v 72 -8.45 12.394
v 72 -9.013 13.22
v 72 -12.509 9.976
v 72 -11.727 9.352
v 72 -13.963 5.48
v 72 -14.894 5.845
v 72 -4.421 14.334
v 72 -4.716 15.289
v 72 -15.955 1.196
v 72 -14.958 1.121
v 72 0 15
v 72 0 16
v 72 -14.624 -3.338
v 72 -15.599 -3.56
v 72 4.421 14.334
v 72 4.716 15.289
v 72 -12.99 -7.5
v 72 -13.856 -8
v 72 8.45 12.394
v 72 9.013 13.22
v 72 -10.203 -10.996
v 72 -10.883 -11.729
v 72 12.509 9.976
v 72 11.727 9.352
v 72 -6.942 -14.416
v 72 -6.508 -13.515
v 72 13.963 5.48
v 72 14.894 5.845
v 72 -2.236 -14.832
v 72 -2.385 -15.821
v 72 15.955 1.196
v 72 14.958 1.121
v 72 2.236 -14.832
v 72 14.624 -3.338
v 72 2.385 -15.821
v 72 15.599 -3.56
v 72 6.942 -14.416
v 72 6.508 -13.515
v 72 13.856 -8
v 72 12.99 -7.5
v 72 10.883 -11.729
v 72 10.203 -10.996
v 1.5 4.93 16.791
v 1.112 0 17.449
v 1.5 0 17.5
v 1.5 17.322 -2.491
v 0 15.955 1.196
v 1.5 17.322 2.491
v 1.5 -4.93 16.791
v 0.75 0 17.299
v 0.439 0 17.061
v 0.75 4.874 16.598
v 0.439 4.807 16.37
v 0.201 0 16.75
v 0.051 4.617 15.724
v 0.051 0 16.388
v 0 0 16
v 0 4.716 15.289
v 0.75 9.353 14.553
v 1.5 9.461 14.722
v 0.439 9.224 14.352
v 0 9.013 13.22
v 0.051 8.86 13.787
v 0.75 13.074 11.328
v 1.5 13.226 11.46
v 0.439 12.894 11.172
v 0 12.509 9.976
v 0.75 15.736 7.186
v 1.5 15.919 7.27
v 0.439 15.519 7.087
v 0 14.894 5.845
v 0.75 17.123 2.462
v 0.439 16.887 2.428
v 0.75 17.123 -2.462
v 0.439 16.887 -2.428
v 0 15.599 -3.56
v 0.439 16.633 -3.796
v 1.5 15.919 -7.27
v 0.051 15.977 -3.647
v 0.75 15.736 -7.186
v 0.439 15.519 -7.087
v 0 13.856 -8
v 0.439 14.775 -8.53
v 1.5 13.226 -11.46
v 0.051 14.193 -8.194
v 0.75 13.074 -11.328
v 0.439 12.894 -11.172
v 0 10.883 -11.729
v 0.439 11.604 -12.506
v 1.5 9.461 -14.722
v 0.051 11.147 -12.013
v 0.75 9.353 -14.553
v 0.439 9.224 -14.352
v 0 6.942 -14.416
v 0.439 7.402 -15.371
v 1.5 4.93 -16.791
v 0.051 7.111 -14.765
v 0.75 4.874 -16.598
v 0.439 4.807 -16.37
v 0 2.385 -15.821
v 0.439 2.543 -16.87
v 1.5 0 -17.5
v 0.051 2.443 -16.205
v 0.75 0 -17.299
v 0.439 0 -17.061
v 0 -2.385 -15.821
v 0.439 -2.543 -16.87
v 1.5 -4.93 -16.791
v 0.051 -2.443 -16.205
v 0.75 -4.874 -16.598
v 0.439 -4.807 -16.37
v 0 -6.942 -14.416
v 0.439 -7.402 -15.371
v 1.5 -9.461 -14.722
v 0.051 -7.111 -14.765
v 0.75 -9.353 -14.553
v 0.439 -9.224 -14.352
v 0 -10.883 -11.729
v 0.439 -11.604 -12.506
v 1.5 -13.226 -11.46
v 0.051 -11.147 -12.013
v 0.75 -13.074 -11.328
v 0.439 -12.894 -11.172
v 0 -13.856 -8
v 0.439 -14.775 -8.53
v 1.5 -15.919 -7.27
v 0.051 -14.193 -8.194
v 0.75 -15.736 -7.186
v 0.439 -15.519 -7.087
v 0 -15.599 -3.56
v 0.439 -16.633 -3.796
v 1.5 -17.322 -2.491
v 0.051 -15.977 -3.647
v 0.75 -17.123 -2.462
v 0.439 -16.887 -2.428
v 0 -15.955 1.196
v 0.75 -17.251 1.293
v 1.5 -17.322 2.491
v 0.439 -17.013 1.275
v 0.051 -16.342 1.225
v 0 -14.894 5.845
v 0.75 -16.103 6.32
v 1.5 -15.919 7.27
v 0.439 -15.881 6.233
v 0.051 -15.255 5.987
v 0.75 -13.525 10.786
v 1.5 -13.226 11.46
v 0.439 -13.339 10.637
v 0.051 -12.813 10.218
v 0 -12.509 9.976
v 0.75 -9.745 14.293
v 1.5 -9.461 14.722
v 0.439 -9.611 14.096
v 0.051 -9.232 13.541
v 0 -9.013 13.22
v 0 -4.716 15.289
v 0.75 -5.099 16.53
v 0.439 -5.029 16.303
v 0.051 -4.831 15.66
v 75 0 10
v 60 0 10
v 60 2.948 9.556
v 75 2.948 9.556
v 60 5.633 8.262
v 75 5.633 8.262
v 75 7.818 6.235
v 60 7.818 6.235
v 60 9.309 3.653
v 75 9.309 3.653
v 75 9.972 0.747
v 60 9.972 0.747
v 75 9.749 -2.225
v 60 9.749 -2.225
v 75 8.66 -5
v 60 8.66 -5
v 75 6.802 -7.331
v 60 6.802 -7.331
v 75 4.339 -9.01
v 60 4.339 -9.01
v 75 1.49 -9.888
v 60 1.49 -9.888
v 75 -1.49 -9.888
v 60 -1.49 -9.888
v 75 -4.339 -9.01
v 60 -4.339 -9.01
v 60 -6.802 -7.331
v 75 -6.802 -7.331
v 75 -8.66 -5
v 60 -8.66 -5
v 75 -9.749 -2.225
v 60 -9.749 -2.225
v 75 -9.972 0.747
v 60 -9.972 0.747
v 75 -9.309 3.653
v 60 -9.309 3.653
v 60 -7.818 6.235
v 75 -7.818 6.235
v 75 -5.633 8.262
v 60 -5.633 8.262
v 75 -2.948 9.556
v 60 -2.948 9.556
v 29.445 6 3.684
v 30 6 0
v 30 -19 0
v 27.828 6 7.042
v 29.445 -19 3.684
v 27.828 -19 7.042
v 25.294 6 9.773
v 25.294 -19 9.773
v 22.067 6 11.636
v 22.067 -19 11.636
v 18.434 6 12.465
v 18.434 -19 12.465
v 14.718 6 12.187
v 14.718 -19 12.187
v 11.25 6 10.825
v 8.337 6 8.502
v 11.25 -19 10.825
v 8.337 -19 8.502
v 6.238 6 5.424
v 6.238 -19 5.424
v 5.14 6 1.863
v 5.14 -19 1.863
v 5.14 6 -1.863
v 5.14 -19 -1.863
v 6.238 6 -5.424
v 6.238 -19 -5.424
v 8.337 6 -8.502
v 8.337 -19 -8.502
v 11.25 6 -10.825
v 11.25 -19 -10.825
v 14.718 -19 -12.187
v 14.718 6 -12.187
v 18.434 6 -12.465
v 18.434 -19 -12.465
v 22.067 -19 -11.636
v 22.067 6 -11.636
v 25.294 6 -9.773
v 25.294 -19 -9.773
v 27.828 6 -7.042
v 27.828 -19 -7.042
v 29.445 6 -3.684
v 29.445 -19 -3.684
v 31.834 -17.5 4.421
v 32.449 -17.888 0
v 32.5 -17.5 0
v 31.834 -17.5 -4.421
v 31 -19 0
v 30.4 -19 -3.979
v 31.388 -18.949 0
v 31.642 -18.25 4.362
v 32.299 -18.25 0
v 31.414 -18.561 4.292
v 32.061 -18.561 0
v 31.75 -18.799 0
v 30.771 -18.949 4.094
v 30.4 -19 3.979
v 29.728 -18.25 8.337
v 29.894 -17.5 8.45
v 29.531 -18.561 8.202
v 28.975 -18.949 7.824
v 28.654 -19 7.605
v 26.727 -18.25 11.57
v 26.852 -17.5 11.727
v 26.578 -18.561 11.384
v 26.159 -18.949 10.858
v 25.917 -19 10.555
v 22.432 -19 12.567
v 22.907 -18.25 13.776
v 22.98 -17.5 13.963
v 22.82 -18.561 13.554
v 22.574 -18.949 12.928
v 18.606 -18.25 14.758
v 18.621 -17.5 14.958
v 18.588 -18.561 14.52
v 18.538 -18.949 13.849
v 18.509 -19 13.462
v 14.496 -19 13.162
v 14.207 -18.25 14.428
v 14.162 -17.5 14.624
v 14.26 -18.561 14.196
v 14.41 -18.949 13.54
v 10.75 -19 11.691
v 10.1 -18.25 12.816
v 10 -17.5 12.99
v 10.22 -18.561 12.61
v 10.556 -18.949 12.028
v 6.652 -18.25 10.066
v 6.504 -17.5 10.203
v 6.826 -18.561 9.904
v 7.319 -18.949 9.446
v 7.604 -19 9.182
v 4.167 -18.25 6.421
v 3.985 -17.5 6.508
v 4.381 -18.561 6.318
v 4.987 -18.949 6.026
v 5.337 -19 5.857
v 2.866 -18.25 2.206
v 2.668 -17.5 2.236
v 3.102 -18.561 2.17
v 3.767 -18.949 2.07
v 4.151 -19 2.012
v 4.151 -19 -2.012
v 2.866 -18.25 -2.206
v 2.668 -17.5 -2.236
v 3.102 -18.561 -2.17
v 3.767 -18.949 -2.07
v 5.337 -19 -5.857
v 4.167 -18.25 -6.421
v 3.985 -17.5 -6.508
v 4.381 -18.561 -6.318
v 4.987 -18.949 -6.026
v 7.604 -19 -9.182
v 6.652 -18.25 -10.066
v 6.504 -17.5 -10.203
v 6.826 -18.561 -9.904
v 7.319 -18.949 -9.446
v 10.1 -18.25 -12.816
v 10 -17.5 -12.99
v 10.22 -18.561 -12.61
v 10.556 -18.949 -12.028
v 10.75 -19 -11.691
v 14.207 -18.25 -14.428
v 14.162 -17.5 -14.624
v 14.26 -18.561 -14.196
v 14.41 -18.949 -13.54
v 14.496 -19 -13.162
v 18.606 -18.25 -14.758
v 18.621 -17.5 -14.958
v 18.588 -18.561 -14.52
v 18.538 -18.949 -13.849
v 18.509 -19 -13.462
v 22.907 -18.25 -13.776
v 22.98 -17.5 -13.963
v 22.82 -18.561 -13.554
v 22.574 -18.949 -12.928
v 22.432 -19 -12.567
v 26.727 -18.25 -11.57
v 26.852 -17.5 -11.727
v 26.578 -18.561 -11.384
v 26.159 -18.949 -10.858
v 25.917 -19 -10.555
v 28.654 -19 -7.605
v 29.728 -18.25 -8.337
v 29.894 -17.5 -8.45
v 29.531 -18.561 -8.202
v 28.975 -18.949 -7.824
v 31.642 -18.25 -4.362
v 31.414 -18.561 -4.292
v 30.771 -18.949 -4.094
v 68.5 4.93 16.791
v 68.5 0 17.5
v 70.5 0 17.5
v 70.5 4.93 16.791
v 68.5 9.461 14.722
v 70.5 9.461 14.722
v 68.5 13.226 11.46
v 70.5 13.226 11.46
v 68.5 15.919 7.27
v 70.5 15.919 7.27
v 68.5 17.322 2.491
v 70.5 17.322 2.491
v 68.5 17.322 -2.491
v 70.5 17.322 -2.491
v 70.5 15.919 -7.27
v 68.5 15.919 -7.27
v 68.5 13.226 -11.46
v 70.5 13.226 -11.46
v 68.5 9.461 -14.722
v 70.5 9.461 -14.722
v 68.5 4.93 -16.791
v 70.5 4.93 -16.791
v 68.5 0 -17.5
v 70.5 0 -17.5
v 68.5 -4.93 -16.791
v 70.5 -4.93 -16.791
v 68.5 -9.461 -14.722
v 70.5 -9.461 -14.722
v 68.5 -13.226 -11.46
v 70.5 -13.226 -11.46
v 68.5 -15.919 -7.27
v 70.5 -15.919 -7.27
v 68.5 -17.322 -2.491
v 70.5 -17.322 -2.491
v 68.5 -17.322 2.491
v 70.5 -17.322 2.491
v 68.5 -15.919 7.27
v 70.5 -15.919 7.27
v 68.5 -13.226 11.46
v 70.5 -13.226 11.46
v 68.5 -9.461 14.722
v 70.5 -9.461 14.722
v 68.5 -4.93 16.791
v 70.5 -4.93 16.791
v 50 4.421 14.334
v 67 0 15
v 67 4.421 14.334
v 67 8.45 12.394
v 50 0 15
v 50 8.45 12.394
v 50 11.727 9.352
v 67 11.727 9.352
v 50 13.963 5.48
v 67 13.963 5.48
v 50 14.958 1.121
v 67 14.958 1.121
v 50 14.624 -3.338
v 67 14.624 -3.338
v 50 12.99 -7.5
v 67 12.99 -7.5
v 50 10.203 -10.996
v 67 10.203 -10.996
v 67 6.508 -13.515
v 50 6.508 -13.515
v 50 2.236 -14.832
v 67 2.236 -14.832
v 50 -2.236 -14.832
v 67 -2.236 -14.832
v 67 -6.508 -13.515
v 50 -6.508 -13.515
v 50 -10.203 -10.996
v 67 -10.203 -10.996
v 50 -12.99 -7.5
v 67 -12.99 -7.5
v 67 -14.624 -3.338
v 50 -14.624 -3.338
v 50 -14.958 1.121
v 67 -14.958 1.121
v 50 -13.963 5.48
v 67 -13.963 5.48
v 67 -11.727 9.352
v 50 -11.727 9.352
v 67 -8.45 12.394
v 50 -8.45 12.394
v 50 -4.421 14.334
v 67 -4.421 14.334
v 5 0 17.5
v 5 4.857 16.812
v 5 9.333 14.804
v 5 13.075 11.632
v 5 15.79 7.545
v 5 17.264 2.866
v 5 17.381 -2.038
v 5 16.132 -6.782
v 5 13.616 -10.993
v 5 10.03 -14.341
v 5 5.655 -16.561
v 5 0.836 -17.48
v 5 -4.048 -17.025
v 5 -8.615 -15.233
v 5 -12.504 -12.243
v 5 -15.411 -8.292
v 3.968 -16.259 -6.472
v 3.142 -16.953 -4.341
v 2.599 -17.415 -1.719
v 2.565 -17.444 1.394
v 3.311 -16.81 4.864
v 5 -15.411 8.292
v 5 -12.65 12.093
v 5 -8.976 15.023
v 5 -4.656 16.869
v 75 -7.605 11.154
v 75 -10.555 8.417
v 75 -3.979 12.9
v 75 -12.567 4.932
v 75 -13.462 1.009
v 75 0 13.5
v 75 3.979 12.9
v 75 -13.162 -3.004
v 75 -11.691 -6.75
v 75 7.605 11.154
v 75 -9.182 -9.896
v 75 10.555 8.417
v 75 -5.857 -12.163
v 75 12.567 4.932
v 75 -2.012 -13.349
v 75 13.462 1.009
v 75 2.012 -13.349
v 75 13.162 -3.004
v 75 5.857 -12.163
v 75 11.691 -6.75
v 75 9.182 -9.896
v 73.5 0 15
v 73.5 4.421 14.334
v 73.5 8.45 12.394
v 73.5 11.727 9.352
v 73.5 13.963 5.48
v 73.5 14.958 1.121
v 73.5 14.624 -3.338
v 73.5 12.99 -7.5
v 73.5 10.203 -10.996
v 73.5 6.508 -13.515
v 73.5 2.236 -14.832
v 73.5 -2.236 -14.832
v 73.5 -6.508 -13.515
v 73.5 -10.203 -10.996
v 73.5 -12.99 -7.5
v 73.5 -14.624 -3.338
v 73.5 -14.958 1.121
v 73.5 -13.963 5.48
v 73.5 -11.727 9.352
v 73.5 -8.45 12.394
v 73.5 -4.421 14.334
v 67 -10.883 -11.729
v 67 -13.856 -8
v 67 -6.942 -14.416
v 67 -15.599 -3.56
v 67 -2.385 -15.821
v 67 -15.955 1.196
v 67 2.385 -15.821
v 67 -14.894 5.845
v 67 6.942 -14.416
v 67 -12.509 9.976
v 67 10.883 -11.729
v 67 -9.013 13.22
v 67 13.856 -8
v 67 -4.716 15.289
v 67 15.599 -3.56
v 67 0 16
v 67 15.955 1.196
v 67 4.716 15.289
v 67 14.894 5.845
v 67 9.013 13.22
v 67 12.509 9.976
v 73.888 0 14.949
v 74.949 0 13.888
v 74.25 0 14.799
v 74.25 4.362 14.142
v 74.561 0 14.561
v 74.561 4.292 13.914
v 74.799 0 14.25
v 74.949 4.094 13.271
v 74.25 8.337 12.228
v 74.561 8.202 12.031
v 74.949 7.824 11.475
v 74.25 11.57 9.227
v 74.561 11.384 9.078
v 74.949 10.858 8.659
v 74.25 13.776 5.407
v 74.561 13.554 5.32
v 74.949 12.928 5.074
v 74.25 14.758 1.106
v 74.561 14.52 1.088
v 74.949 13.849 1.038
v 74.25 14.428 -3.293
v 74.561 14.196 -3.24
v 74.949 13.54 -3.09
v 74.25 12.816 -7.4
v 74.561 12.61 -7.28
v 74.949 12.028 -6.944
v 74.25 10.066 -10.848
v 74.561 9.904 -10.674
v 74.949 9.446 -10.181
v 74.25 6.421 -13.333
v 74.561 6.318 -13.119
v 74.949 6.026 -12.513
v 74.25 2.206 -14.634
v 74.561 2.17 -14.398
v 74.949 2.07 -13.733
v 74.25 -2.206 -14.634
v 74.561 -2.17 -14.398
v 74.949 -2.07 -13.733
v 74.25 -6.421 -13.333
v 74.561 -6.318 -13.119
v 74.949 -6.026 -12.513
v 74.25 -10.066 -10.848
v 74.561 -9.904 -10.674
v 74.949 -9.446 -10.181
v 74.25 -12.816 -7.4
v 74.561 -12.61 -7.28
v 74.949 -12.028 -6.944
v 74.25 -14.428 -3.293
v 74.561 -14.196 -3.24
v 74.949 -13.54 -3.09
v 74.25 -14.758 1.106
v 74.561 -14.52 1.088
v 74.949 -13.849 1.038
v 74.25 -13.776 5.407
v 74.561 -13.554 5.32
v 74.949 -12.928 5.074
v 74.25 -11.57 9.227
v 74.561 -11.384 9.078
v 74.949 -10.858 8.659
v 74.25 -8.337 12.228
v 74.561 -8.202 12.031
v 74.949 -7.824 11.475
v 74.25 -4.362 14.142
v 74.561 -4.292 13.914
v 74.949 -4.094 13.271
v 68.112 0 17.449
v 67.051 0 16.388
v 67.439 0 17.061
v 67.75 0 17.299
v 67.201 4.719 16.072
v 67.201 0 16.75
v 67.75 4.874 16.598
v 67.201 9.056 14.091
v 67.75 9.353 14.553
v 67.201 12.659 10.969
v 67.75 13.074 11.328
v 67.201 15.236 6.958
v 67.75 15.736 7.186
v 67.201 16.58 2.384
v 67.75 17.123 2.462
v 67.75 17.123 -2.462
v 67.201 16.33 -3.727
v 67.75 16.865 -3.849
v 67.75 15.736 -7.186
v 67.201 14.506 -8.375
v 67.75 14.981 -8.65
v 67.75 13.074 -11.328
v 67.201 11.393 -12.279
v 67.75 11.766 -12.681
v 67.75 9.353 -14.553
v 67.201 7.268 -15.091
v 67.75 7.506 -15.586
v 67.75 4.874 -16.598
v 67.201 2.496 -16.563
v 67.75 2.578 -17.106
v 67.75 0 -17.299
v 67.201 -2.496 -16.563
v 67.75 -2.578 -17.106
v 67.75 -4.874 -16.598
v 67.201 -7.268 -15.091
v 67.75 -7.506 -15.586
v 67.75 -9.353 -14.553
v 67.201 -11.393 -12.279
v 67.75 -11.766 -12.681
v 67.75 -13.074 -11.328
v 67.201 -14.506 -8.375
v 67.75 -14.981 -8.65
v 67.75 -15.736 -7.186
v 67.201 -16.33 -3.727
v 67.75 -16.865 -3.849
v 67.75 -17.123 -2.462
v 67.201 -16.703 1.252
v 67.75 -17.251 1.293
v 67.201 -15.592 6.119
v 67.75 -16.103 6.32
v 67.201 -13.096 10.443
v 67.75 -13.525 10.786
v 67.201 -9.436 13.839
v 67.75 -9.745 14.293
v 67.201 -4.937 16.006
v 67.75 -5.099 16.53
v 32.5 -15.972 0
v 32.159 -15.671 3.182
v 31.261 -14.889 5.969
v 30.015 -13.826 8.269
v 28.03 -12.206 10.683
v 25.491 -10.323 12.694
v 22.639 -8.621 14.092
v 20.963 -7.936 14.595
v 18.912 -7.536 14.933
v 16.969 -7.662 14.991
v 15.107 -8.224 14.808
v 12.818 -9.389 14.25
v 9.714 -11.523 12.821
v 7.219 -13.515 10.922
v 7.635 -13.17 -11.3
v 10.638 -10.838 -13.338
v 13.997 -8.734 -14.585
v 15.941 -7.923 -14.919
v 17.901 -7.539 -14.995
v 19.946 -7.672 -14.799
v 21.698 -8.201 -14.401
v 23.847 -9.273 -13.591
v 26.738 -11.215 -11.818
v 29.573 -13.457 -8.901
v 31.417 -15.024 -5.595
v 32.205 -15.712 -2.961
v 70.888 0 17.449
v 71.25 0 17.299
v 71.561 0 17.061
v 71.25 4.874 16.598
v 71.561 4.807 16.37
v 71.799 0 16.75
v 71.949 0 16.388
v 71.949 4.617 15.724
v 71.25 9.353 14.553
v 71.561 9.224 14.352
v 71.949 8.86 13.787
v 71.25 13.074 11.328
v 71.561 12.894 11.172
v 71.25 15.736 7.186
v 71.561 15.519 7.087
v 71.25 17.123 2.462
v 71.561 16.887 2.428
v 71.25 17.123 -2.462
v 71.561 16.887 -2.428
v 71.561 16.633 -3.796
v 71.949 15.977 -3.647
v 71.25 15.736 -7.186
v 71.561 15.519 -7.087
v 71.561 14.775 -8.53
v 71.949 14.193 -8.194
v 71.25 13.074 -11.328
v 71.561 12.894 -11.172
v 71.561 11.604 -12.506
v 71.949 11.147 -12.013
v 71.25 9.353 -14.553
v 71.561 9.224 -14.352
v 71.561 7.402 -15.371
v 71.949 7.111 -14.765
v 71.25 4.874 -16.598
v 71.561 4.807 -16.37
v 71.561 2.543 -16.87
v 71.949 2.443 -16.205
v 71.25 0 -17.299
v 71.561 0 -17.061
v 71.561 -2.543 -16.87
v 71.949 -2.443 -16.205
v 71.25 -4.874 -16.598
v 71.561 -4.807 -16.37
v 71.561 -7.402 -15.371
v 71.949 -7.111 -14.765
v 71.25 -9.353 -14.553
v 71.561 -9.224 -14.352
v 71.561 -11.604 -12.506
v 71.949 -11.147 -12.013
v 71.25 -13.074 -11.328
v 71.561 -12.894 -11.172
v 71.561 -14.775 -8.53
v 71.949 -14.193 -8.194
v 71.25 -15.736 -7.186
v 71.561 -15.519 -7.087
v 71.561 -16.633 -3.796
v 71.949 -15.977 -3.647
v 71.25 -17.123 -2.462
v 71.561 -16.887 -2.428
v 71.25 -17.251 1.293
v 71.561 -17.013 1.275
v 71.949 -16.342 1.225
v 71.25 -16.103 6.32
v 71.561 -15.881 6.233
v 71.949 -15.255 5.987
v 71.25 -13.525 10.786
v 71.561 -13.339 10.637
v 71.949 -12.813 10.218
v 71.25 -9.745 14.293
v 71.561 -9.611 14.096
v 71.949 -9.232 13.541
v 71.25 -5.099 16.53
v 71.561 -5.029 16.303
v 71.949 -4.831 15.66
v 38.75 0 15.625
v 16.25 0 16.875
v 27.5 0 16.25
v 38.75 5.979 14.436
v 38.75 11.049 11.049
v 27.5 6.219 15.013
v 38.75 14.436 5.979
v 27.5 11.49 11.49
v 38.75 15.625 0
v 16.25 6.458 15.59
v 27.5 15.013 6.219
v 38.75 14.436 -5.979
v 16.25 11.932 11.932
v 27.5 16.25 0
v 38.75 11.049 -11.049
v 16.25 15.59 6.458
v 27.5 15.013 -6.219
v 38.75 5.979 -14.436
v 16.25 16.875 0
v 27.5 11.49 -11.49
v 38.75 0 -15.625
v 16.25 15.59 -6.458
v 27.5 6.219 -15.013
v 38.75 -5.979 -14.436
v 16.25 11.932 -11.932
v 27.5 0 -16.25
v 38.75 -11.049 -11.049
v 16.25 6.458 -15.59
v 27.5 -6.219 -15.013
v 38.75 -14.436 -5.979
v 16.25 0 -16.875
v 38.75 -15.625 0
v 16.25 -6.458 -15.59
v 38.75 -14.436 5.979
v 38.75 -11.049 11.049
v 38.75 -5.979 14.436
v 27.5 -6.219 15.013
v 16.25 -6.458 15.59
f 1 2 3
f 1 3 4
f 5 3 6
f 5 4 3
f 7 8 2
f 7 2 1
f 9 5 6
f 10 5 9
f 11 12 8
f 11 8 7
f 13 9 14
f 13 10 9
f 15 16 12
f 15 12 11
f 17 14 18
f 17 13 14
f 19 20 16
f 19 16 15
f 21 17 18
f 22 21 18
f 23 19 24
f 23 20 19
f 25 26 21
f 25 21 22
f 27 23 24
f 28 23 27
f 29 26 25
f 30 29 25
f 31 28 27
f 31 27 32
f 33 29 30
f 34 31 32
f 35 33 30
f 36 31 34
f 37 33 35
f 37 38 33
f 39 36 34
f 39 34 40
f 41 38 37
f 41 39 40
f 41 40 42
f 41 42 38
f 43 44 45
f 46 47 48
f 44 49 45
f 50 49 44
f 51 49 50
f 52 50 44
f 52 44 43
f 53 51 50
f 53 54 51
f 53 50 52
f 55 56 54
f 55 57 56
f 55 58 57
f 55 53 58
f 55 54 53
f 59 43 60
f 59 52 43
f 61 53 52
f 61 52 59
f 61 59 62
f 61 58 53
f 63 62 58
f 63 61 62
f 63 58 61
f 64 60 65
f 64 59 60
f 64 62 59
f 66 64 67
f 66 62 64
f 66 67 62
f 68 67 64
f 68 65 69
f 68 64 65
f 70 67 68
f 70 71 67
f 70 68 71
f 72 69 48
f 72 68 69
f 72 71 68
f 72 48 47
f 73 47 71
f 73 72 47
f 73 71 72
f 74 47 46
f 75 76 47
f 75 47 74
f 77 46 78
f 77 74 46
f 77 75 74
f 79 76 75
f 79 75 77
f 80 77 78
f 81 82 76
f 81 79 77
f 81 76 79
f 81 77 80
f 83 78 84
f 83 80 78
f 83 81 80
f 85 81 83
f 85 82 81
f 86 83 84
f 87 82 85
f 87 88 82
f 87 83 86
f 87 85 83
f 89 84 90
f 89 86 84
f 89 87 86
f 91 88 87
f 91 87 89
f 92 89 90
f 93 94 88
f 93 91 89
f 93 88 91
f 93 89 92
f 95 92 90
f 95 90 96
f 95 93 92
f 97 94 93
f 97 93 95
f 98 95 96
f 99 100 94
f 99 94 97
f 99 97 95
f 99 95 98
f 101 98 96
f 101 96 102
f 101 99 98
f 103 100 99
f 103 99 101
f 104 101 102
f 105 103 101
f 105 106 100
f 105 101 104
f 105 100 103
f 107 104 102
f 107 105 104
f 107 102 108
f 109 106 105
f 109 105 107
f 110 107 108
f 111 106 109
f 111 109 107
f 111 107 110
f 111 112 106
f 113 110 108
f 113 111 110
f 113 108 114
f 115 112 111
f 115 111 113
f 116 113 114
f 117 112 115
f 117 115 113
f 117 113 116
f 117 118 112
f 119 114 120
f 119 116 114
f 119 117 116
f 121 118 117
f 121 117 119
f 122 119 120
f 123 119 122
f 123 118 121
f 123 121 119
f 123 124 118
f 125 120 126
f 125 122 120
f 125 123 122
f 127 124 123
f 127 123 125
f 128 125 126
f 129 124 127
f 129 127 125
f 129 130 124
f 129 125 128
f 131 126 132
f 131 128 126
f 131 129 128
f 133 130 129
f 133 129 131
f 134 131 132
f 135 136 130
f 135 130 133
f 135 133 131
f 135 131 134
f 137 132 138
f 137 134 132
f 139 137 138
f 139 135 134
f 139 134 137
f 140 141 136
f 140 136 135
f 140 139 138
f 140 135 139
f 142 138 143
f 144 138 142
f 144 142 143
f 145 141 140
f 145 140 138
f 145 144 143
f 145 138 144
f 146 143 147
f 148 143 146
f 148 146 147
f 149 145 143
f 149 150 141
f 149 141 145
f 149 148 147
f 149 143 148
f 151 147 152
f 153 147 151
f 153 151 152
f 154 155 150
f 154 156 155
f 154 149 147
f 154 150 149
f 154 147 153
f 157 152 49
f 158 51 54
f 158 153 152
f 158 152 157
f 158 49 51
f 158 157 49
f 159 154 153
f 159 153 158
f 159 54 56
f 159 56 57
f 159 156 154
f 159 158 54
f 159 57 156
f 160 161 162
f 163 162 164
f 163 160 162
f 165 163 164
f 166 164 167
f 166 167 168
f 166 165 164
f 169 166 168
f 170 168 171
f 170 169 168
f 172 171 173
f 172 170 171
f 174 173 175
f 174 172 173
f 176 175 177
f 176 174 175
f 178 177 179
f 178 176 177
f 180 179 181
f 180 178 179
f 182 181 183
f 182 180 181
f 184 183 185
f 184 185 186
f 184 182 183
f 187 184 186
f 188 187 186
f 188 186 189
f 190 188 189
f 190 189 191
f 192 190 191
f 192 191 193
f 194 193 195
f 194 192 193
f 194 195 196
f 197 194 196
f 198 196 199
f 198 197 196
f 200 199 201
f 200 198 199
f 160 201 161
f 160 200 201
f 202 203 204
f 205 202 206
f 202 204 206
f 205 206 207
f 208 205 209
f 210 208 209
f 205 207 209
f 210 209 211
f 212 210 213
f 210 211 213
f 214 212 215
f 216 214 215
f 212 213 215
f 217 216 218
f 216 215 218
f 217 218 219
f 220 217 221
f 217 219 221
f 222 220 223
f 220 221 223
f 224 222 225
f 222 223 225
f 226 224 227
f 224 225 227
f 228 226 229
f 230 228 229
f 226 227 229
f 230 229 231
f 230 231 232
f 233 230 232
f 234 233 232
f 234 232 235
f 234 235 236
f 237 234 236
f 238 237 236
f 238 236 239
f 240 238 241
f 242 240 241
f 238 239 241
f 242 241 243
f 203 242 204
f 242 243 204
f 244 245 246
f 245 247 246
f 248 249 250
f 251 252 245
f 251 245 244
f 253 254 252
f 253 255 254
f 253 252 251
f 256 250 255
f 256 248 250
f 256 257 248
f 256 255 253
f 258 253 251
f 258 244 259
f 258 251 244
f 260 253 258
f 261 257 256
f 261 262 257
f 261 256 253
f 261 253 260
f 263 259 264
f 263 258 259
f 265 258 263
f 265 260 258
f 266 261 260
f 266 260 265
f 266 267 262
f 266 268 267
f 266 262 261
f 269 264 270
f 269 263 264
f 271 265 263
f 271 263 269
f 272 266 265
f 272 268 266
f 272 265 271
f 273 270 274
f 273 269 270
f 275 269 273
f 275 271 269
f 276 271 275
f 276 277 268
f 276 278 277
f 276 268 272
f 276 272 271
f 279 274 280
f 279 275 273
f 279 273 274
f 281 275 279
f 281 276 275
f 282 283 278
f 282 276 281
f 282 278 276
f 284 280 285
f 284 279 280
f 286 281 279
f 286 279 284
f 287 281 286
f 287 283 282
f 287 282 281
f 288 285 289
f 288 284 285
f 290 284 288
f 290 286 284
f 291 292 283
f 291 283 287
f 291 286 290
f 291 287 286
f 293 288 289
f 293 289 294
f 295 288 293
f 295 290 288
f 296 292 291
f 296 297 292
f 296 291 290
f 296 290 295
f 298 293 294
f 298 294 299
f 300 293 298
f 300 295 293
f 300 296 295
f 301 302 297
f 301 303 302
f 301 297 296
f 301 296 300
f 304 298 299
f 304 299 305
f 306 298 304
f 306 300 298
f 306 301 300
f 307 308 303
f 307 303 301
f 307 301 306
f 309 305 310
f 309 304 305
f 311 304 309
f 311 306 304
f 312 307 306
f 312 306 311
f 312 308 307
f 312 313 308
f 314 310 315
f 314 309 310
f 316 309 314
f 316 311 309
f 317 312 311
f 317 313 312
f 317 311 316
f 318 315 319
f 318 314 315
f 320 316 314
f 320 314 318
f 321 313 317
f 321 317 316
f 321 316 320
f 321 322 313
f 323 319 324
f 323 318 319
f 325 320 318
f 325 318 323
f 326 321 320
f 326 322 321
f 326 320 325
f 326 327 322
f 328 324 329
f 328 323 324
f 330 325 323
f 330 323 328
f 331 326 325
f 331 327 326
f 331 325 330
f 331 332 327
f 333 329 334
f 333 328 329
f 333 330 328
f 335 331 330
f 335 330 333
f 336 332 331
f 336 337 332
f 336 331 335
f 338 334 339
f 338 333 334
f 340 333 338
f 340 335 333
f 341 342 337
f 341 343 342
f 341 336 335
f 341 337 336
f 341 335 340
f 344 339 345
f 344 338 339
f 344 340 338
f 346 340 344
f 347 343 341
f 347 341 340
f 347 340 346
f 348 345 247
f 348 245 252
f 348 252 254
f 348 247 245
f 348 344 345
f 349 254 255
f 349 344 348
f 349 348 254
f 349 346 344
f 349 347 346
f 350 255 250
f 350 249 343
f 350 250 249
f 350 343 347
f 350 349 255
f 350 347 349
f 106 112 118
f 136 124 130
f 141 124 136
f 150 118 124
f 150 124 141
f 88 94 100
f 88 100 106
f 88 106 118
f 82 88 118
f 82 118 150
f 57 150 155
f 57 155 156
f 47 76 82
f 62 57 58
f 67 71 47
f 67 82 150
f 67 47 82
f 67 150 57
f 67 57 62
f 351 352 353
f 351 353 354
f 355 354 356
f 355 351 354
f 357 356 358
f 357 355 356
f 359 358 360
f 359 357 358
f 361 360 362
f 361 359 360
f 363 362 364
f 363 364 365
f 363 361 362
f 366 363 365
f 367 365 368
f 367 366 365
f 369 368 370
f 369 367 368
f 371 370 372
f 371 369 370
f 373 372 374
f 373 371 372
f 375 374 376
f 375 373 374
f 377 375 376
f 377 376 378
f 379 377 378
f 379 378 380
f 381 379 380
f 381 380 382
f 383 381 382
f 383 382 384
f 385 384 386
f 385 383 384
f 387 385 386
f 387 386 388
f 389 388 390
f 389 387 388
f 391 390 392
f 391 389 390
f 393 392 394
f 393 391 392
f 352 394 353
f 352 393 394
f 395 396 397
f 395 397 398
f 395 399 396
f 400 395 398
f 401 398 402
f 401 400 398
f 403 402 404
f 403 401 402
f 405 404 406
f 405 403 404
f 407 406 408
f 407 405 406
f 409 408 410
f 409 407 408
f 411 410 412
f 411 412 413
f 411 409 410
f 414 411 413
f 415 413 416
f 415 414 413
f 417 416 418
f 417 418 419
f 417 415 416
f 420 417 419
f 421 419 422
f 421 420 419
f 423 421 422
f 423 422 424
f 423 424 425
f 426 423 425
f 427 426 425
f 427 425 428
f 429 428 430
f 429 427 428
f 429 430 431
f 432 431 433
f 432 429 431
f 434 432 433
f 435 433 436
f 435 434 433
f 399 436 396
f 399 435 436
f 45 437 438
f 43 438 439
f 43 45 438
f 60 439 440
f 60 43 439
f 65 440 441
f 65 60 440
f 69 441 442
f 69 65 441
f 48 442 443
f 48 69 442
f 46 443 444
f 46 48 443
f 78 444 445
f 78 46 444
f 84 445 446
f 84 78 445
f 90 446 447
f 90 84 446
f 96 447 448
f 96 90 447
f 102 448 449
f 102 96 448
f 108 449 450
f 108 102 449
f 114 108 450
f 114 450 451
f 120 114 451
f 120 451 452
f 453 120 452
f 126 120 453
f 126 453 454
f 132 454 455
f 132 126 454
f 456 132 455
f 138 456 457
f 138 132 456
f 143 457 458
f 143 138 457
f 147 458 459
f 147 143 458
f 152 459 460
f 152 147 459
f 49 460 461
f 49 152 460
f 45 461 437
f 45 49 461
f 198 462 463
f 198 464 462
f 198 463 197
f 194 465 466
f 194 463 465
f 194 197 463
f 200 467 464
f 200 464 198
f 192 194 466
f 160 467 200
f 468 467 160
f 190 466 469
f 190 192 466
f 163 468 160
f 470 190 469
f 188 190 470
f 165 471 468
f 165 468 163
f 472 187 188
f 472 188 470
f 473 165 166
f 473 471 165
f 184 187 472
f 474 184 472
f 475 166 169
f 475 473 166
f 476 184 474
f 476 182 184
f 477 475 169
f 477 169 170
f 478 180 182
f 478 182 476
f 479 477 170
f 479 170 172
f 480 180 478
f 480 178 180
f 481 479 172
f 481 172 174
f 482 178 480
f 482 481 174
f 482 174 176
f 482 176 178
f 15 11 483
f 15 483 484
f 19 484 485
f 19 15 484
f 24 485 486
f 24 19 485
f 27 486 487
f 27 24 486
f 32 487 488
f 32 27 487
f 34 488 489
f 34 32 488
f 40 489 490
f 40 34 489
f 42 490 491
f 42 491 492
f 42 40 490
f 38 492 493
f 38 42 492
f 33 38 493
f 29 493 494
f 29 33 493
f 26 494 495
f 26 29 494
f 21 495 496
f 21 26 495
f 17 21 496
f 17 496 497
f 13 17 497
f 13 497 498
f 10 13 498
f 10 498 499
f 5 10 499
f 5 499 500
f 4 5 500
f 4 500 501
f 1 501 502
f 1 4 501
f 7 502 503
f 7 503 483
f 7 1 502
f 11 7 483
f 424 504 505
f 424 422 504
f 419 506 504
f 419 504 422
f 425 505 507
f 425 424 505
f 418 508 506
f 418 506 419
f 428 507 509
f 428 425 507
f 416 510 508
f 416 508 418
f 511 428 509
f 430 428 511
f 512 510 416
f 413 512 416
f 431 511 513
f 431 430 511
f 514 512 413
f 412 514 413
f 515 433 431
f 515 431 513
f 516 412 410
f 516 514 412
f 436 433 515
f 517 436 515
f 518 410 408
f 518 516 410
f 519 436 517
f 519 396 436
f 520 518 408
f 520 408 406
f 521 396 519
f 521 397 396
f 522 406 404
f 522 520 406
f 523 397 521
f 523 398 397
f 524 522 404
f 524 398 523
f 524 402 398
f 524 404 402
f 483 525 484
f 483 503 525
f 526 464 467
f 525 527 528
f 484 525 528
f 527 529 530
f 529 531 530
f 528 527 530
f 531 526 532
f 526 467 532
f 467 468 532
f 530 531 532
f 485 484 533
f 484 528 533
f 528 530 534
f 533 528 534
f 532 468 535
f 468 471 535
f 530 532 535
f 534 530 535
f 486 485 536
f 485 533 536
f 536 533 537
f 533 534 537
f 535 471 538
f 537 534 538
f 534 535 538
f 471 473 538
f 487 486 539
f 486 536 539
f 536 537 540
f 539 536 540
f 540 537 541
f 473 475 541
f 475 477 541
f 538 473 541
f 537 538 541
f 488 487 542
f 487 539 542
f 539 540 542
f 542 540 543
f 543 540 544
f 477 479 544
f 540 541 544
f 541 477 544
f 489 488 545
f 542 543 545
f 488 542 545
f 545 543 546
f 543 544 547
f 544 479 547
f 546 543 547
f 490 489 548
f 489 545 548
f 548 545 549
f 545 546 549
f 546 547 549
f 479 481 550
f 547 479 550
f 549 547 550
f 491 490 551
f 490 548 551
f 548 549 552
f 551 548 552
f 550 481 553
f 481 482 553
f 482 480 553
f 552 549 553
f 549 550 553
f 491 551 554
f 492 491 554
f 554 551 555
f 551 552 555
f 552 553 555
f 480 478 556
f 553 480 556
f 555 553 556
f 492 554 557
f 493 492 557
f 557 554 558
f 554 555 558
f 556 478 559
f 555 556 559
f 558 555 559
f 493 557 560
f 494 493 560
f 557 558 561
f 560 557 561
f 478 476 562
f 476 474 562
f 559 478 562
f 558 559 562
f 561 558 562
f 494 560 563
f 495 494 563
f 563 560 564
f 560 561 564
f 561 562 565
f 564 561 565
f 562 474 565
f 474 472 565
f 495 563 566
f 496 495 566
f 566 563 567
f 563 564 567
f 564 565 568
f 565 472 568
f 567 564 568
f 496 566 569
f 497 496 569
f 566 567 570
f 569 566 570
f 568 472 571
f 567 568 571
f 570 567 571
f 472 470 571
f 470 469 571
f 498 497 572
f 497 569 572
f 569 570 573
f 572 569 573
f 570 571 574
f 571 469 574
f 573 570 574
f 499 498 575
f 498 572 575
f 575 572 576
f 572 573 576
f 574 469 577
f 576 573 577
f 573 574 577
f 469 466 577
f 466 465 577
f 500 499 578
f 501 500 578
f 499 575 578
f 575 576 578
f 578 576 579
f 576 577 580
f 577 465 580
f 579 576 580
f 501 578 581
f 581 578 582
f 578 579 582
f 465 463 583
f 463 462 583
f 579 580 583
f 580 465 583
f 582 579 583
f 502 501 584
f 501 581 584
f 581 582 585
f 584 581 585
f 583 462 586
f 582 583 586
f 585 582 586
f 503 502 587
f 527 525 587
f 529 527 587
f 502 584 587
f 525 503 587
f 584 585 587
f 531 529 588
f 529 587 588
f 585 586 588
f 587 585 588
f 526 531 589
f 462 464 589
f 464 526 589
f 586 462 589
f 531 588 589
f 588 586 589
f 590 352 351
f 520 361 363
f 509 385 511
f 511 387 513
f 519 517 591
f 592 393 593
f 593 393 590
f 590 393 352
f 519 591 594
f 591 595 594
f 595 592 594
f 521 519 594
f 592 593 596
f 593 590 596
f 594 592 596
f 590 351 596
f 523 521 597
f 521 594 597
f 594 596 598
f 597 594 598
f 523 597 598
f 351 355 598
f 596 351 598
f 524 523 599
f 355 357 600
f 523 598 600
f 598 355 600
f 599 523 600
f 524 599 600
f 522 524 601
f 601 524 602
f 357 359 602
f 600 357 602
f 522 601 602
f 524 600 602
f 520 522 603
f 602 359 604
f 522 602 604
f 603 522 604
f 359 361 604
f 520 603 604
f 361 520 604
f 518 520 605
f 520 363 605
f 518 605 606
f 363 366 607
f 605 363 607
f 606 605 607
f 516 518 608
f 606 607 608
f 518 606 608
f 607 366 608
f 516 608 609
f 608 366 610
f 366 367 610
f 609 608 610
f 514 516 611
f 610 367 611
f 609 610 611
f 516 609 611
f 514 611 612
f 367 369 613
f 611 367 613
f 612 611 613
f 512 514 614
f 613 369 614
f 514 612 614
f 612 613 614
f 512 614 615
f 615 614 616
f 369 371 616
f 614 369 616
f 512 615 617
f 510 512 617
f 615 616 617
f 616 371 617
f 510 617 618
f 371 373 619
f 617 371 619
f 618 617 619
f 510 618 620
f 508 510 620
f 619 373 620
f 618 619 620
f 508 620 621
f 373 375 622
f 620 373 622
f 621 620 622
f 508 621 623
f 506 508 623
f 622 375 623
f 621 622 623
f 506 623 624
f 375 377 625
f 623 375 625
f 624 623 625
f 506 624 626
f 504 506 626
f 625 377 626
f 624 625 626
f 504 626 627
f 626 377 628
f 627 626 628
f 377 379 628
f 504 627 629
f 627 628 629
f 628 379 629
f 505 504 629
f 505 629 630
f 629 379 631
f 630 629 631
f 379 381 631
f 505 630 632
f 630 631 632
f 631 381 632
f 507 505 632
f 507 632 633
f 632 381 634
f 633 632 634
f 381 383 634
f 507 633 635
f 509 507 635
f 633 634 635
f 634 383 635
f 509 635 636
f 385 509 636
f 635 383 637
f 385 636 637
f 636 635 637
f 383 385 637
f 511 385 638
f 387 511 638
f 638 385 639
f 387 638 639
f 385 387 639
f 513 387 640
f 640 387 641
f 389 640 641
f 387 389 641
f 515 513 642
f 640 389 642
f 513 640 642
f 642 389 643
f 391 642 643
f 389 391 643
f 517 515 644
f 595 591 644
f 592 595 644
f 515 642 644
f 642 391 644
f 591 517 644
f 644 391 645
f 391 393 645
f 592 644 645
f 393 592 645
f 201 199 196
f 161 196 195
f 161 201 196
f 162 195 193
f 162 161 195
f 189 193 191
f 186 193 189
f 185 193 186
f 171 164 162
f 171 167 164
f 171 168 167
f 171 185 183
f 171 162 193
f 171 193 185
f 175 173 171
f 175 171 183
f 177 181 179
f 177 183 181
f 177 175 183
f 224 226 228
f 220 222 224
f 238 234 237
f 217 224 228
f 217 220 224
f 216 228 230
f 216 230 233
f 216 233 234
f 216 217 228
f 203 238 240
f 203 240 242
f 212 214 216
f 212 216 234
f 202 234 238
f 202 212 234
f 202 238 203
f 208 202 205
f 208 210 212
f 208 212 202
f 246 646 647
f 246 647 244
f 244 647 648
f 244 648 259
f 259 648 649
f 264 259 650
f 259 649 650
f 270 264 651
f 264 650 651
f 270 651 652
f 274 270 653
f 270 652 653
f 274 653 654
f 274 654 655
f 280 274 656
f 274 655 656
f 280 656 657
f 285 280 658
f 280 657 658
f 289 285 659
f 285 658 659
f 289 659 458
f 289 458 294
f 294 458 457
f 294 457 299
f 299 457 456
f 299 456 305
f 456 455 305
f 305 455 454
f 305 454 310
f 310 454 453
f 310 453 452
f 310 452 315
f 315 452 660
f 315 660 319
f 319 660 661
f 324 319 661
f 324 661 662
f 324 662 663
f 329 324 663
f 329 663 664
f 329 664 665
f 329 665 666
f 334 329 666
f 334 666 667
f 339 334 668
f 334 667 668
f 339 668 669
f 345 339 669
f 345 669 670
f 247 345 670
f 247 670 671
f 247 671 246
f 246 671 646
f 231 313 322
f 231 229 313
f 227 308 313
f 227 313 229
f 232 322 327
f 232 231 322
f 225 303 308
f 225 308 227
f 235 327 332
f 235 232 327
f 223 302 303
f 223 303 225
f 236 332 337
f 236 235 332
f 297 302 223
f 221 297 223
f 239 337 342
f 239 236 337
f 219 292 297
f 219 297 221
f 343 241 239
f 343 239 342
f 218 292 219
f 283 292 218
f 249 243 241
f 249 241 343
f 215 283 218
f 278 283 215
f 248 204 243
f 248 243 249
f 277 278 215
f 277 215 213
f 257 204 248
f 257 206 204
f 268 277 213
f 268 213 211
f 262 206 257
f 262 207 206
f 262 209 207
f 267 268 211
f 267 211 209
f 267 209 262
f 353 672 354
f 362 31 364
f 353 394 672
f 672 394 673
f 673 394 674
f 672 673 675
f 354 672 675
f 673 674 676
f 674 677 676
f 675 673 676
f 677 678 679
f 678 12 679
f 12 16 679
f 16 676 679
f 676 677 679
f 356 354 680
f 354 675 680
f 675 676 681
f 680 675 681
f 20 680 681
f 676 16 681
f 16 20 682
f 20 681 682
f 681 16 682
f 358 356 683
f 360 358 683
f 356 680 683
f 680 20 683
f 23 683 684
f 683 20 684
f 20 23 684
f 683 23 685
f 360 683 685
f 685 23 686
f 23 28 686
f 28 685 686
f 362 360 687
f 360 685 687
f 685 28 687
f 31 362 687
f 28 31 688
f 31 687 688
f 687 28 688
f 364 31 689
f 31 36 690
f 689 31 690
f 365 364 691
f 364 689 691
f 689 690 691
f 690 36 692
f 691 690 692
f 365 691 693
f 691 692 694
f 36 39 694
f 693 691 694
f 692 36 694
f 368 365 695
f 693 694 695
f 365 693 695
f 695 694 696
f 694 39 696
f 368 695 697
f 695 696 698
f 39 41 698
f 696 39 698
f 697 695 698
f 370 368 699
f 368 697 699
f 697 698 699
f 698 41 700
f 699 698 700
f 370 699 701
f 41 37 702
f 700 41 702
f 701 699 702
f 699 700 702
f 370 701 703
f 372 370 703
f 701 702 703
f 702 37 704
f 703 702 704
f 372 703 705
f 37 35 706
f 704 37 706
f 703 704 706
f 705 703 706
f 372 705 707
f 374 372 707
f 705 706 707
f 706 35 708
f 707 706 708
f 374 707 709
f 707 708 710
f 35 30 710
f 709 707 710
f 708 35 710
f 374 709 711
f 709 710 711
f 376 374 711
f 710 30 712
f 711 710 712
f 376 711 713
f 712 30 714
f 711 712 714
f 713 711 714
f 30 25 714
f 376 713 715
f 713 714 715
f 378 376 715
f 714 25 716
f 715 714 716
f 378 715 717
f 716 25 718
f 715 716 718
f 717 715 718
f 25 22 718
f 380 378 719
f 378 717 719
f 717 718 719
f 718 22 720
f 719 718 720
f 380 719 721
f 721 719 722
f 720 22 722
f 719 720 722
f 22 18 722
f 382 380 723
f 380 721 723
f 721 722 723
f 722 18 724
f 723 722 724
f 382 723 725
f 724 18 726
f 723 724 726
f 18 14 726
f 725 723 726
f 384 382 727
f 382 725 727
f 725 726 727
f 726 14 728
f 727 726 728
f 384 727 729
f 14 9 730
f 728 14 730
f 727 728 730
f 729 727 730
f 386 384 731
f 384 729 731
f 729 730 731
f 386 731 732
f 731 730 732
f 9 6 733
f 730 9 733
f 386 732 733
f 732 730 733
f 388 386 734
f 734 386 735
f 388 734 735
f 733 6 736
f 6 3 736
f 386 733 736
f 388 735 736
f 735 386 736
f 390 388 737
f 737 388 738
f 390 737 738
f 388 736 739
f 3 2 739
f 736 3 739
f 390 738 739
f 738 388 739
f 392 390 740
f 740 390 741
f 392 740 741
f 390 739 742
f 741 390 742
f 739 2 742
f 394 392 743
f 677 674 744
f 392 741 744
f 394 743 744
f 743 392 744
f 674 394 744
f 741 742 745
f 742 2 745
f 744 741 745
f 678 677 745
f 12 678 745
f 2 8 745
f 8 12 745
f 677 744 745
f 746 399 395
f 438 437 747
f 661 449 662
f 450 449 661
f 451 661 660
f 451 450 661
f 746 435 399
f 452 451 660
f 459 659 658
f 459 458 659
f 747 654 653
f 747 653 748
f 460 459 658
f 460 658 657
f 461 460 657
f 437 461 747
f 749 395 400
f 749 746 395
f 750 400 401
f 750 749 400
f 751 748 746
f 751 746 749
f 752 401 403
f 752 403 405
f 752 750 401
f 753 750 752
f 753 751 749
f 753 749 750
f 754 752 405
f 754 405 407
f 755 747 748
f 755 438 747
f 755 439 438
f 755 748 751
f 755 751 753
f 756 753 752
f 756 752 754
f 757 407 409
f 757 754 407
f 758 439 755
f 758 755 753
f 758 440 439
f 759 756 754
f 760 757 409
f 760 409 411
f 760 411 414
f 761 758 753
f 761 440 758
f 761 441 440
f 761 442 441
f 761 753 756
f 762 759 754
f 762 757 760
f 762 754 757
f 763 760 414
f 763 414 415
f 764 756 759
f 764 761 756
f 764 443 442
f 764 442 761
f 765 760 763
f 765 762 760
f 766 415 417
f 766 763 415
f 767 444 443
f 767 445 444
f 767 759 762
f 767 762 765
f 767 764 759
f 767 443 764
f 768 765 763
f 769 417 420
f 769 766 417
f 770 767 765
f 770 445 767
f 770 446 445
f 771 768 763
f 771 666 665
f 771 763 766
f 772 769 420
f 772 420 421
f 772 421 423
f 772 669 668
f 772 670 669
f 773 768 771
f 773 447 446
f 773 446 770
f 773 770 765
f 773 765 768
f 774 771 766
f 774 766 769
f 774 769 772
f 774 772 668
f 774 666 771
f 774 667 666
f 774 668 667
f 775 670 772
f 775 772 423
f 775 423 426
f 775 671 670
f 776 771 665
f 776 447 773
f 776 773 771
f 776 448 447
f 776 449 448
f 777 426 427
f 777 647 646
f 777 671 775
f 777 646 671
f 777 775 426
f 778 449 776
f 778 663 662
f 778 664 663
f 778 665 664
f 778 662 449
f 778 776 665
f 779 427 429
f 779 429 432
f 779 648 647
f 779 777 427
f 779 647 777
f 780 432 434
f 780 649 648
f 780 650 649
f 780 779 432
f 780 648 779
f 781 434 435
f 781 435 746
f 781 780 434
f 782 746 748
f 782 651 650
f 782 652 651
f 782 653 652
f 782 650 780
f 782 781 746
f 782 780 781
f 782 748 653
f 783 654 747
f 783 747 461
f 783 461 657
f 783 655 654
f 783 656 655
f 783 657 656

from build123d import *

# Parameters (mm, degrees)
F2_R     = 15
F3_DEPTH = 19
F4_R     = 12.5
F5_DEPTH = 25
F6_R     = 1.5


with BuildPart() as f1:
    # F0 (on Front) → F1 (revolve)
    with BuildSketch(Plane.XZ):
        Polygon((0, 17.5), (0, 0), (60, 0), (60, 10), (75, 10), (75, 15), (72, 15), (72, 17.5), (67, 17.5), (67, 15), (50, 15), (5, 17.5), align=None)
    revolve(axis=Axis((30, 0, 0), (-1, 0, 0)))

    # F2 (on Front) → F3 (join)
    with BuildSketch(Plane.XZ):
        with Locations((17.5, 0)):
            Circle(F2_R)
    extrude(amount=F3_DEPTH)

    # F4 (on face) → F5 (cut)
    with BuildSketch(Plane.XZ.offset(19)):
        with Locations((17.5, 0)):
            Circle(F4_R)
    extrude(amount=-F5_DEPTH, mode=Mode.SUBTRACT)

    # F6
    f6_edges = [f1.edges().sort_by_distance(p)[0] for p in [
        (0, 0, -17.5),
        (67, 0, -17.5),
        (72, 0, -17.5),
        (2.5, -19, 0),
        (75, 0, -15),
    ]]
    fillet(f6_edges, radius=F6_R)


solid = f1.part
